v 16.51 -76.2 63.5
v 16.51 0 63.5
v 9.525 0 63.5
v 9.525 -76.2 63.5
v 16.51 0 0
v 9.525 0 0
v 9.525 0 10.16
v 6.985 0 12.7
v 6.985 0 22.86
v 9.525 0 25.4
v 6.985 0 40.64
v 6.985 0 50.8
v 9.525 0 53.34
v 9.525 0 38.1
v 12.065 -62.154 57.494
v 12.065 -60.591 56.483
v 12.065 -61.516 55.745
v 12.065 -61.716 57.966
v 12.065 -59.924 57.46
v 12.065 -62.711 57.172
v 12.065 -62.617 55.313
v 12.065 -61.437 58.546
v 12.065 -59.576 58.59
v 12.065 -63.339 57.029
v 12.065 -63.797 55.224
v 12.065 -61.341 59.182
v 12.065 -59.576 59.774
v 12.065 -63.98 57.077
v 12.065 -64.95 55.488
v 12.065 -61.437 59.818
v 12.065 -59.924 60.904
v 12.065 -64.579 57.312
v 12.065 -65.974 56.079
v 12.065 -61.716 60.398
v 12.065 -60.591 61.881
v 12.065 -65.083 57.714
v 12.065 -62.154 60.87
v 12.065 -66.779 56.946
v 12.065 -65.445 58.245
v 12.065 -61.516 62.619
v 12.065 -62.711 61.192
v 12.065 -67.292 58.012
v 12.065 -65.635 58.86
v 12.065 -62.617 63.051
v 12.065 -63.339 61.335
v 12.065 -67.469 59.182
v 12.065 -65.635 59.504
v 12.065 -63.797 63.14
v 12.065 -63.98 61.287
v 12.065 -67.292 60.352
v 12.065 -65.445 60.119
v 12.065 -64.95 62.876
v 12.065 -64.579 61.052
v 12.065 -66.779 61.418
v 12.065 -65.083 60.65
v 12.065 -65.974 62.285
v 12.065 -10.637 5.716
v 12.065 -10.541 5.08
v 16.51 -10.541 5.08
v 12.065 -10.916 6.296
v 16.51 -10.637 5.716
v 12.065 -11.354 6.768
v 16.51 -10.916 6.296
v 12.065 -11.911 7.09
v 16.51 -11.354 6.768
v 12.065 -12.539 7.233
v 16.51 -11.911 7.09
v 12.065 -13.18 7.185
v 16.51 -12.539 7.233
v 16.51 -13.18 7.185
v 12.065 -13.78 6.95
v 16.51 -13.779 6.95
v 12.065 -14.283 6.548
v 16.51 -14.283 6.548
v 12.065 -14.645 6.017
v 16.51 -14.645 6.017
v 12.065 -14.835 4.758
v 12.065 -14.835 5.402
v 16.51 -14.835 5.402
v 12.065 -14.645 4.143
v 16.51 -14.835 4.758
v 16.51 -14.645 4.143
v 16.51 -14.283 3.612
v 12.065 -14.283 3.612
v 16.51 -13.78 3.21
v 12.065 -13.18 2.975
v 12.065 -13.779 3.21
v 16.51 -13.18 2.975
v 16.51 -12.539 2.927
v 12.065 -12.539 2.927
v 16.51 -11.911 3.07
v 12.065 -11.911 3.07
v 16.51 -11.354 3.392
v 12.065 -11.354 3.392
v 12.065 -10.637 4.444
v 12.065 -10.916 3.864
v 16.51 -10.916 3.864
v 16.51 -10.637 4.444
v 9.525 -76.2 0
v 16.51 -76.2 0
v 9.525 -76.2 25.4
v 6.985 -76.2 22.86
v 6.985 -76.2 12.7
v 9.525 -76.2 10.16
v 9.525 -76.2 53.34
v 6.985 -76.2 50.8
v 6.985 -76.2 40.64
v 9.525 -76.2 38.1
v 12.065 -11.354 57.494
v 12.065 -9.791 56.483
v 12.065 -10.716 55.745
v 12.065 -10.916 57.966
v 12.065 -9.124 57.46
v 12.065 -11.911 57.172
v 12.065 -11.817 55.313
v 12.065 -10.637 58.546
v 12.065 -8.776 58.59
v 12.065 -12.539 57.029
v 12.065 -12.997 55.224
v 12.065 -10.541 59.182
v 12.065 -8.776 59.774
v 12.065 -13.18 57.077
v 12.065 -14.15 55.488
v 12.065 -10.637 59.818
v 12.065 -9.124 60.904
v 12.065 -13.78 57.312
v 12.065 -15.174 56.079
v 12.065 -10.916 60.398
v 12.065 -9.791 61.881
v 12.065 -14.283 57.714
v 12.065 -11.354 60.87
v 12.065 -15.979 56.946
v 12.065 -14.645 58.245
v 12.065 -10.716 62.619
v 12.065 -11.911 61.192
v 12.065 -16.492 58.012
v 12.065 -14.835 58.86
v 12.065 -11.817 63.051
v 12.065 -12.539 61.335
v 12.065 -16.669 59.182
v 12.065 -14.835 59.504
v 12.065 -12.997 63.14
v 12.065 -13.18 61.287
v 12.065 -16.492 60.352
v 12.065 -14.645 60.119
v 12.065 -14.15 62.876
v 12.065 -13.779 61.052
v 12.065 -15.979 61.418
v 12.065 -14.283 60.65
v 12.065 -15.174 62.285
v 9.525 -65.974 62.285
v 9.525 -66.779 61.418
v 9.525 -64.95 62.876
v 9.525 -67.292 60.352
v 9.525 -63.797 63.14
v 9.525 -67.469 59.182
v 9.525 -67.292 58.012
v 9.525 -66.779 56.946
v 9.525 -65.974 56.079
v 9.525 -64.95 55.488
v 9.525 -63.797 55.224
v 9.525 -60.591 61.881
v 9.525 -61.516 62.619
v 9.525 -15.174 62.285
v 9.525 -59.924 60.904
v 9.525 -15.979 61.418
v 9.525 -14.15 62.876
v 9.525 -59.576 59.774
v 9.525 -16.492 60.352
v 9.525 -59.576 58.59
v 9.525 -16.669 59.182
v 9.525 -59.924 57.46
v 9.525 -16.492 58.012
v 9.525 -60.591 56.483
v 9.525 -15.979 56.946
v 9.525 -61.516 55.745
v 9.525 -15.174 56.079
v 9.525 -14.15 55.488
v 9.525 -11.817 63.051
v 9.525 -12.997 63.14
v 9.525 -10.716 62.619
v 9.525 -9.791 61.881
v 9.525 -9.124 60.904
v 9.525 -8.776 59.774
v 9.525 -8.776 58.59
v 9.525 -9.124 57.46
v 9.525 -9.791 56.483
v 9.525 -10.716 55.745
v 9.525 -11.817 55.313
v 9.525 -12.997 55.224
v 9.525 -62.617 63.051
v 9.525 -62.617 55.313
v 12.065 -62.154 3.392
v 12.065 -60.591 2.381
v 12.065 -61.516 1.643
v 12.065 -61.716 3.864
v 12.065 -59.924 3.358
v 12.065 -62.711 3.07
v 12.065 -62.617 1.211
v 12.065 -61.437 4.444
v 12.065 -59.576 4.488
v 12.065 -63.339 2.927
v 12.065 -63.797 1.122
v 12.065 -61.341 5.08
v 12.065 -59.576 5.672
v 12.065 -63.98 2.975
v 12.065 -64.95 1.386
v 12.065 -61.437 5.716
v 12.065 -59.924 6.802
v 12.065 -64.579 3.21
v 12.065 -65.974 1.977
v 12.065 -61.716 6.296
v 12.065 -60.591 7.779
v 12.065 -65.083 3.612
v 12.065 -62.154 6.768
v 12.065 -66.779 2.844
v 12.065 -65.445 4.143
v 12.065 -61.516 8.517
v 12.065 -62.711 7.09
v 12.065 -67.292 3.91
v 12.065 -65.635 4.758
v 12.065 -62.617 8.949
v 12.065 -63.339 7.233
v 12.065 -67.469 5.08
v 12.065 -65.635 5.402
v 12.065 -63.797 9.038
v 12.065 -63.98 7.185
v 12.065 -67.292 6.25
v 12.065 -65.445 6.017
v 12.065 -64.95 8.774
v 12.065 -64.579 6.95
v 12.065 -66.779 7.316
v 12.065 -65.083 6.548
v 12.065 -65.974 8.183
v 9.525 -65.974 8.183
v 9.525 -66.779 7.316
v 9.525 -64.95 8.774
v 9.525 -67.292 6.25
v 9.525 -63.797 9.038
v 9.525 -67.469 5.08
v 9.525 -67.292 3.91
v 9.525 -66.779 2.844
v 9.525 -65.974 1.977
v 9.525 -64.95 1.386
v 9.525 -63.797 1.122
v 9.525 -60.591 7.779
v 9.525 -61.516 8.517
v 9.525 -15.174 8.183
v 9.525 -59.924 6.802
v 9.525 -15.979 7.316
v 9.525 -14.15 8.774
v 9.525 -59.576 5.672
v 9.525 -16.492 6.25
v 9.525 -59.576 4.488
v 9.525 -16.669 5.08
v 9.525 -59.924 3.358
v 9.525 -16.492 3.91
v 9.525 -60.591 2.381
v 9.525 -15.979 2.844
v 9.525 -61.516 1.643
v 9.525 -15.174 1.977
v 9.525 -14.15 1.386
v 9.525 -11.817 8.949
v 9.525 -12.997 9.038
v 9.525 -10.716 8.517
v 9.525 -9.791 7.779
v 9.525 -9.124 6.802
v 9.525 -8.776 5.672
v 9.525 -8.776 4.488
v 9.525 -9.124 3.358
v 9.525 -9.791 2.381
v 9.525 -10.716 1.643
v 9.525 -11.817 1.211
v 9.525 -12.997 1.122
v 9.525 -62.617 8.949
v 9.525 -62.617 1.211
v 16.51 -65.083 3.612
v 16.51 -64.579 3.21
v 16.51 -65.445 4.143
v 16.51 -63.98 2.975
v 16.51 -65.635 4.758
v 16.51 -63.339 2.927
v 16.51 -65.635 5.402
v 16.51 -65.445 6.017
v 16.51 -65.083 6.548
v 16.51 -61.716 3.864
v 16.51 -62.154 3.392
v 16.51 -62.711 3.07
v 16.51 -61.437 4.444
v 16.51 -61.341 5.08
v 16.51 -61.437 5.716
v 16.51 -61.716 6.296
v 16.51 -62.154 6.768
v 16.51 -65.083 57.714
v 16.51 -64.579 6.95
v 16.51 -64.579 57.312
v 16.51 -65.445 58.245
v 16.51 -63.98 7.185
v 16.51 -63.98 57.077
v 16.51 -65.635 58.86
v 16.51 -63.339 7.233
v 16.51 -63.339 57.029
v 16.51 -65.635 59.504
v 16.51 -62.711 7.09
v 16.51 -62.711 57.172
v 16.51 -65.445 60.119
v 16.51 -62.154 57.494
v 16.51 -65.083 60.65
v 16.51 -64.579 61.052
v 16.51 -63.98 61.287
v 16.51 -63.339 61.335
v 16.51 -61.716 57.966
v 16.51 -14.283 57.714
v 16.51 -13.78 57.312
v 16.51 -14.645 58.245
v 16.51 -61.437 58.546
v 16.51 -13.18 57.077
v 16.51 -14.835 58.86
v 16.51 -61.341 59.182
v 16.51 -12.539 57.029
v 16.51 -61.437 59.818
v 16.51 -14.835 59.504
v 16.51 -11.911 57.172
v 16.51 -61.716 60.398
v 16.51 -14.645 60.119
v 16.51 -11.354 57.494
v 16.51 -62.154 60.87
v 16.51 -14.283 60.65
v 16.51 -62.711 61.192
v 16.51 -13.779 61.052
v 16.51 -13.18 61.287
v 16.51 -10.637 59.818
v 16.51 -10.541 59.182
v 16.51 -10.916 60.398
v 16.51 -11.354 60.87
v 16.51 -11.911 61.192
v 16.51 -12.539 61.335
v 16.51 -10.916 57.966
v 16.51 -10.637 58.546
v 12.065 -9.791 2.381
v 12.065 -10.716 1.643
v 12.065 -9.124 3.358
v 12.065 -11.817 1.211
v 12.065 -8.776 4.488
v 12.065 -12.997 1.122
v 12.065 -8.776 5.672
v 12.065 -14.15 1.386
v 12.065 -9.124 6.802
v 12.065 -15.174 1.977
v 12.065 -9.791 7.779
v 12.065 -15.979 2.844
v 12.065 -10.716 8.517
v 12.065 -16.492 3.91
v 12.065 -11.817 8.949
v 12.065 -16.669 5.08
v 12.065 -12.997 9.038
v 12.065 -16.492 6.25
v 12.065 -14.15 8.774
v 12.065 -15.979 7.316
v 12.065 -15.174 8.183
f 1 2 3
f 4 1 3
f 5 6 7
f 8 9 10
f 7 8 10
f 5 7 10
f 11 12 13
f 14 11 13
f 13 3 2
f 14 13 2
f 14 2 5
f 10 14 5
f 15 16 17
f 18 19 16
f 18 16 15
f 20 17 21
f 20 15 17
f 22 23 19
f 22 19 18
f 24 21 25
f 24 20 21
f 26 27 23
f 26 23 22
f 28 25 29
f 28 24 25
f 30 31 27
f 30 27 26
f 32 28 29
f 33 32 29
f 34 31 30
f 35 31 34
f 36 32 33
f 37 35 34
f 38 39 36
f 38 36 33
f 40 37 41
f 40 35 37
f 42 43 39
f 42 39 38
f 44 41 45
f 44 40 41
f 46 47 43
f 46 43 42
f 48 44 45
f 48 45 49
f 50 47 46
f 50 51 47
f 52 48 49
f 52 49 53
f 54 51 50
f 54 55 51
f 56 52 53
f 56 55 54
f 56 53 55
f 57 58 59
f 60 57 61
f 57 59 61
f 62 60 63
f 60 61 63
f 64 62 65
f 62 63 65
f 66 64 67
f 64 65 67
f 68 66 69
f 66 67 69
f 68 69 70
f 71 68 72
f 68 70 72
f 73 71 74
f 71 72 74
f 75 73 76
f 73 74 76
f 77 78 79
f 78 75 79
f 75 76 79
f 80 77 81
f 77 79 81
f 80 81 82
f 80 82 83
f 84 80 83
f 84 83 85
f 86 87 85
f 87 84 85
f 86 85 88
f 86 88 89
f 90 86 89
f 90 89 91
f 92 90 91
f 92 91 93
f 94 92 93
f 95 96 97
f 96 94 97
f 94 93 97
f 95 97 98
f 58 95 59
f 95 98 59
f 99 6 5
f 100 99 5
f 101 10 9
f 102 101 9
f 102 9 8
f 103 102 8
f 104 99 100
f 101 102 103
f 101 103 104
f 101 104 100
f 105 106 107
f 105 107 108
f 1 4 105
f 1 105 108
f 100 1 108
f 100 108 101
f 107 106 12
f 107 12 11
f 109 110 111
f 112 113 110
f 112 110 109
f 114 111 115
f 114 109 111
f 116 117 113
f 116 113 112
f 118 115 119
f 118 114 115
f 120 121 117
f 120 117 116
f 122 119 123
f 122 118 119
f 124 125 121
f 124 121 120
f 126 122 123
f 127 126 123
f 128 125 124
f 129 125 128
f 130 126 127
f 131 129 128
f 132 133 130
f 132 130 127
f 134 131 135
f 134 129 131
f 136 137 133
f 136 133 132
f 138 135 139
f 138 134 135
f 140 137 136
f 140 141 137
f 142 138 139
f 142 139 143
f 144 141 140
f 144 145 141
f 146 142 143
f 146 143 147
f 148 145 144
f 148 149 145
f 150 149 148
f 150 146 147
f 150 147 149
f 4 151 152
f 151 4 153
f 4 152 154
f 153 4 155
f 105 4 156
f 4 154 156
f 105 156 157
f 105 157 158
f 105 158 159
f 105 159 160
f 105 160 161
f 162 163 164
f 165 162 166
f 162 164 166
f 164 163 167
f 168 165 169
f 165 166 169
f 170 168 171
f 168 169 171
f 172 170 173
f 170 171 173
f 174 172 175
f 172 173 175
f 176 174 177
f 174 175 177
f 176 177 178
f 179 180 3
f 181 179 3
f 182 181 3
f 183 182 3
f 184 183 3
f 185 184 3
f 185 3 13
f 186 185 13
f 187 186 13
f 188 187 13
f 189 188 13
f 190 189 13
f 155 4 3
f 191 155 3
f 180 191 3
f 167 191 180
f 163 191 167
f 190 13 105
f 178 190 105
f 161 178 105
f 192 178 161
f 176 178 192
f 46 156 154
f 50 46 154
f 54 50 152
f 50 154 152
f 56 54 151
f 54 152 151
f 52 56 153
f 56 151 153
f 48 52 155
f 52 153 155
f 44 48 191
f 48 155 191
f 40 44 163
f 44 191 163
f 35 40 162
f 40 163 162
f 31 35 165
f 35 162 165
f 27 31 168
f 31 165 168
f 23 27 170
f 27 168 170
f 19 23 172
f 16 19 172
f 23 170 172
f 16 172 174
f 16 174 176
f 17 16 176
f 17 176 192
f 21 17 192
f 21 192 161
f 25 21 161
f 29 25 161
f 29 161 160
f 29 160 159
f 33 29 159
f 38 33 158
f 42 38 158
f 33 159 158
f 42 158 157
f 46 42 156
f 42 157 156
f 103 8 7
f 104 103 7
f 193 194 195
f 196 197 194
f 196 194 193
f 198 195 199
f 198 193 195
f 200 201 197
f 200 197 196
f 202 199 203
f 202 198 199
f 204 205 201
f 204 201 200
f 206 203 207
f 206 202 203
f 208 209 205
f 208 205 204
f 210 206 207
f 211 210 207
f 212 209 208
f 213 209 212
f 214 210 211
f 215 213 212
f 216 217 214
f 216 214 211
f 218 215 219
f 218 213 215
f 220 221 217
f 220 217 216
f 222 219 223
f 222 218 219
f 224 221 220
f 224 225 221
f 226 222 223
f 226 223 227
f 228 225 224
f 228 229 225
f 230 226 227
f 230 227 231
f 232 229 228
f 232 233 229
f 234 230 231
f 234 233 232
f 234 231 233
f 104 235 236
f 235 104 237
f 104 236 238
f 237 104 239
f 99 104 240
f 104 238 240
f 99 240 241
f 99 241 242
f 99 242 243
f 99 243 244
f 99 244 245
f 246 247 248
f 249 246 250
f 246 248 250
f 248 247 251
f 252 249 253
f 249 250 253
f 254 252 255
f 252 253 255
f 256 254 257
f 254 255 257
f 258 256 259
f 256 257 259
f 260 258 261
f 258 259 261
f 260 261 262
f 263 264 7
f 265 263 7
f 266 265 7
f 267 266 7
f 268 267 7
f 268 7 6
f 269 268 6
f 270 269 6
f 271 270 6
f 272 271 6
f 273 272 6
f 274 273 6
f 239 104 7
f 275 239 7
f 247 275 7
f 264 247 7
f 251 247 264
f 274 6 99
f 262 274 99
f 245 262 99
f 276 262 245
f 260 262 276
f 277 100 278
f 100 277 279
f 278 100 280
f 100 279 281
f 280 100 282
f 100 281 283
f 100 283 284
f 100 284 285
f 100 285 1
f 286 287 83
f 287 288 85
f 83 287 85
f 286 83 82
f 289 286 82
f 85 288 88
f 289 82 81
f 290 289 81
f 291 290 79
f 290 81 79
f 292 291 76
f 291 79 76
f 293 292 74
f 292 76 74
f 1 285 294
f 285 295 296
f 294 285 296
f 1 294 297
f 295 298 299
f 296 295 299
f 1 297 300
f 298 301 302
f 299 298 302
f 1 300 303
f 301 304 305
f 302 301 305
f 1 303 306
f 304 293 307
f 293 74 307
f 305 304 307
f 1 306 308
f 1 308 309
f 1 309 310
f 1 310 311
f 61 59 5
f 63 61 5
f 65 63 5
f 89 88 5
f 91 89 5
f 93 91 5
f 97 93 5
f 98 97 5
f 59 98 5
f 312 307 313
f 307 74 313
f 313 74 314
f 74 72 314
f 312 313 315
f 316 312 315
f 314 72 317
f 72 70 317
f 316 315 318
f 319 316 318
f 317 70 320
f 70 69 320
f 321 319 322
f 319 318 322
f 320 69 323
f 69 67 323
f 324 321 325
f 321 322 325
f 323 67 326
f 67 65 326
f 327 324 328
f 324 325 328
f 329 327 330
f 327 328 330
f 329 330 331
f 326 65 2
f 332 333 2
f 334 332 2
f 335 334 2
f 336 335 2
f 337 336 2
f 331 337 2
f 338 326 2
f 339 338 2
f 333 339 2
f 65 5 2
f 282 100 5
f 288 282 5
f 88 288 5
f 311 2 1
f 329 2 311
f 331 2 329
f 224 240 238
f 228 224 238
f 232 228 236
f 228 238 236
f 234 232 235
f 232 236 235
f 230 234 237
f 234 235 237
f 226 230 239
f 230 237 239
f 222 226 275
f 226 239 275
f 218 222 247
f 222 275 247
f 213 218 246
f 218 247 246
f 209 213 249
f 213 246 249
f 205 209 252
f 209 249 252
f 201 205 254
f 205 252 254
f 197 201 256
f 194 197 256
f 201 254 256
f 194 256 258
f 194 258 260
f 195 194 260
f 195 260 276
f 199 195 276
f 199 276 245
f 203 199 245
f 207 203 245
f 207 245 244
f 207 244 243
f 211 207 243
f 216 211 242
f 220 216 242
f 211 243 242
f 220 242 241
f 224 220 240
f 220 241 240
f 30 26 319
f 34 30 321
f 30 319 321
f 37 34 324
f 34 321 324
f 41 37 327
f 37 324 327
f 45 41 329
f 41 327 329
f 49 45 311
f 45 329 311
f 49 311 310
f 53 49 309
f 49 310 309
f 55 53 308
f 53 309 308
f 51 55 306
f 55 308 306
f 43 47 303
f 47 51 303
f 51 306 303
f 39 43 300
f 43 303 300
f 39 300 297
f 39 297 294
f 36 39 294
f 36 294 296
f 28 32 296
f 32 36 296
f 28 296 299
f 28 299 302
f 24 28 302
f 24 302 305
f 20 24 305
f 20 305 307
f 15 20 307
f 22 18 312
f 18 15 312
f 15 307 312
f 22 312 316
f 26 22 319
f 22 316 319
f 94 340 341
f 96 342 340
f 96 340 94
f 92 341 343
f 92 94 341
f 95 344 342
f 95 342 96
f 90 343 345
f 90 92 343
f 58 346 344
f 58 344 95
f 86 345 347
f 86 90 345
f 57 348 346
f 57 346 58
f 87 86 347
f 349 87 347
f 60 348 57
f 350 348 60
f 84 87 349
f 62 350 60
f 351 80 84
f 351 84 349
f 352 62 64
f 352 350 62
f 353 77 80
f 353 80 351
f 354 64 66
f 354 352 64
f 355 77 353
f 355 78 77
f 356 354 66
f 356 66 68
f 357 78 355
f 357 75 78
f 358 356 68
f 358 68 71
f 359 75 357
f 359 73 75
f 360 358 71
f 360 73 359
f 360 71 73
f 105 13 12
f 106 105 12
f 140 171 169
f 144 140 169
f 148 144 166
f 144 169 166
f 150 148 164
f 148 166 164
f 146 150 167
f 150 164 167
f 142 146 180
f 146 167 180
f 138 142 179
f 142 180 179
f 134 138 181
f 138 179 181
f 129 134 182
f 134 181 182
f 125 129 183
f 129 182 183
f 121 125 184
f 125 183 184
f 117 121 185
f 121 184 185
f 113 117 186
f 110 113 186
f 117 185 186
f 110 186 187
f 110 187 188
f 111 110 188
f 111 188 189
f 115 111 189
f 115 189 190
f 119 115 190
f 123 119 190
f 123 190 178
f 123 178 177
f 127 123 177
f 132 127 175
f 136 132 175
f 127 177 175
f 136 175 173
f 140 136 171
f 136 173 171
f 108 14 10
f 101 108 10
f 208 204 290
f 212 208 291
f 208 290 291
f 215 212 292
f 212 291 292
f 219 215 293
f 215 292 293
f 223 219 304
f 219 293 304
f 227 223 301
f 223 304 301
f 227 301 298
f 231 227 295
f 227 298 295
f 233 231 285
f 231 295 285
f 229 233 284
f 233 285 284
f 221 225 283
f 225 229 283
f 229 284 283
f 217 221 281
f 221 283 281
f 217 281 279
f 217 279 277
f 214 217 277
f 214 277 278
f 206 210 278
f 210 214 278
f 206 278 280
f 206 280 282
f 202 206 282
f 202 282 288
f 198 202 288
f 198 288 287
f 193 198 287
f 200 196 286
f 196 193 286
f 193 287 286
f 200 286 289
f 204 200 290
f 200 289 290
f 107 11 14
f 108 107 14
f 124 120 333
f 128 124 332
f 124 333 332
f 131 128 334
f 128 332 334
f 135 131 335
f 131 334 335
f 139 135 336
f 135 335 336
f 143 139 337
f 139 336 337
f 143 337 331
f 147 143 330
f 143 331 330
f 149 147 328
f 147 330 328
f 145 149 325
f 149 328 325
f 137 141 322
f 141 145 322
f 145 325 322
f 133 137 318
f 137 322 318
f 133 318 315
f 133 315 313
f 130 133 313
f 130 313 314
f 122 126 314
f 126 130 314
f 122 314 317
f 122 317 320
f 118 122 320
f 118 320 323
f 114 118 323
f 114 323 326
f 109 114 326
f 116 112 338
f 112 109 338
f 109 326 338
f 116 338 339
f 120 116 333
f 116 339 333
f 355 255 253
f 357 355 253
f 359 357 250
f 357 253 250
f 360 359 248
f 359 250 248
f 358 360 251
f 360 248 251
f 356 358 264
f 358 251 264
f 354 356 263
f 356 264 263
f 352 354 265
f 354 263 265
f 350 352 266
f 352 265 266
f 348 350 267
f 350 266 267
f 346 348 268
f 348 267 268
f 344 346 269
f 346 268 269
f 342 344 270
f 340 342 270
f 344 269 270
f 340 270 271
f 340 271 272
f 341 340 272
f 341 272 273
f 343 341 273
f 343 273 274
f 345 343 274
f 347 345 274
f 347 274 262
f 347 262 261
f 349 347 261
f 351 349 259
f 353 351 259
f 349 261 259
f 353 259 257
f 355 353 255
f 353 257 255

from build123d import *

# Parameters (mm, degrees)
F1_DEPTH = 76.2
F3_D     = 4.318
F3_DEPTH = 12.7
F3_TIP   = 1.2972580765
F4_D     = 4.318
F4_DEPTH = 12.7
F4_TIP   = 1.2972580765
F5_R     = 3.96875
F5_R_2   = 2.159
F6_DEPTH = 2.54
F7_DEPTH = 2.54


with BuildPart() as f1:
    # F0 (on Front) → F1 (new body)
    with BuildSketch(Plane.XZ):
        Polygon((6.985, 50.8), (6.985, 40.64), (9.525, 38.1), (9.525, 25.4), (6.985, 22.86), (6.985, 12.7), (9.525, 10.16), (9.525, 0), (16.51, 0), (16.51, 63.5), (9.525, 63.5), (9.525, 53.34), align=None)
    extrude(amount=F1_DEPTH)

    # F3
    with Locations(Plane(origin=(9.525, 0, 0), x_dir=(0, -1, 0), z_dir=(-1, 0, 0))):
        with Locations((12.7, 5.08), (63.5, 5.08)):
            Hole(F3_D / 2, depth=F3_DEPTH)
            with Locations((0, 0, -(F3_DEPTH + F3_TIP / 2))):  # 118° drill point
                Cone(0, F3_D / 2, F3_TIP, mode=Mode.SUBTRACT)

    # F4
    with Locations(Plane(origin=(9.525, 0, 0), x_dir=(0, -1, 0), z_dir=(-1, 0, 0))):
        with Locations((12.7, 59.182), (63.5, 59.182)):
            Hole(F4_D / 2, depth=F4_DEPTH)
            with Locations((0, 0, -(F4_DEPTH + F4_TIP / 2))):  # 118° drill point
                Cone(0, F4_D / 2, F4_TIP, mode=Mode.SUBTRACT)

    # F5 (on face) → F6 (cut)
    with BuildSketch(Plane(origin=(9.525, 0, 0), x_dir=(0, -1, 0), z_dir=(-1, 0, 0))):
        with Locations((12.7, 5.08)):
            Circle(F5_R)
        with Locations((12.7, 5.08)):
            Circle(F5_R_2, mode=Mode.SUBTRACT)
        with Locations((63.5, 5.08)):
            Circle(F5_R)
        with Locations((63.5, 5.08)):
            Circle(F5_R_2, mode=Mode.SUBTRACT)
    extrude(amount=-F6_DEPTH, mode=Mode.SUBTRACT)

    # F5 (on face) → F7 (cut)
    with BuildSketch(Plane(origin=(9.525, 0, 0), x_dir=(0, -1, 0), z_dir=(-1, 0, 0))):
        with Locations((12.7, 59.182)):
            Circle(F5_R)
        with Locations((12.7, 59.182)):
            Circle(F5_R_2, mode=Mode.SUBTRACT)
        with Locations((63.5, 59.182)):
            Circle(F5_R)
        with Locations((63.5, 59.182)):
            Circle(F5_R_2, mode=Mode.SUBTRACT)
    extrude(amount=-F7_DEPTH, mode=Mode.SUBTRACT)


solid = f1.part
